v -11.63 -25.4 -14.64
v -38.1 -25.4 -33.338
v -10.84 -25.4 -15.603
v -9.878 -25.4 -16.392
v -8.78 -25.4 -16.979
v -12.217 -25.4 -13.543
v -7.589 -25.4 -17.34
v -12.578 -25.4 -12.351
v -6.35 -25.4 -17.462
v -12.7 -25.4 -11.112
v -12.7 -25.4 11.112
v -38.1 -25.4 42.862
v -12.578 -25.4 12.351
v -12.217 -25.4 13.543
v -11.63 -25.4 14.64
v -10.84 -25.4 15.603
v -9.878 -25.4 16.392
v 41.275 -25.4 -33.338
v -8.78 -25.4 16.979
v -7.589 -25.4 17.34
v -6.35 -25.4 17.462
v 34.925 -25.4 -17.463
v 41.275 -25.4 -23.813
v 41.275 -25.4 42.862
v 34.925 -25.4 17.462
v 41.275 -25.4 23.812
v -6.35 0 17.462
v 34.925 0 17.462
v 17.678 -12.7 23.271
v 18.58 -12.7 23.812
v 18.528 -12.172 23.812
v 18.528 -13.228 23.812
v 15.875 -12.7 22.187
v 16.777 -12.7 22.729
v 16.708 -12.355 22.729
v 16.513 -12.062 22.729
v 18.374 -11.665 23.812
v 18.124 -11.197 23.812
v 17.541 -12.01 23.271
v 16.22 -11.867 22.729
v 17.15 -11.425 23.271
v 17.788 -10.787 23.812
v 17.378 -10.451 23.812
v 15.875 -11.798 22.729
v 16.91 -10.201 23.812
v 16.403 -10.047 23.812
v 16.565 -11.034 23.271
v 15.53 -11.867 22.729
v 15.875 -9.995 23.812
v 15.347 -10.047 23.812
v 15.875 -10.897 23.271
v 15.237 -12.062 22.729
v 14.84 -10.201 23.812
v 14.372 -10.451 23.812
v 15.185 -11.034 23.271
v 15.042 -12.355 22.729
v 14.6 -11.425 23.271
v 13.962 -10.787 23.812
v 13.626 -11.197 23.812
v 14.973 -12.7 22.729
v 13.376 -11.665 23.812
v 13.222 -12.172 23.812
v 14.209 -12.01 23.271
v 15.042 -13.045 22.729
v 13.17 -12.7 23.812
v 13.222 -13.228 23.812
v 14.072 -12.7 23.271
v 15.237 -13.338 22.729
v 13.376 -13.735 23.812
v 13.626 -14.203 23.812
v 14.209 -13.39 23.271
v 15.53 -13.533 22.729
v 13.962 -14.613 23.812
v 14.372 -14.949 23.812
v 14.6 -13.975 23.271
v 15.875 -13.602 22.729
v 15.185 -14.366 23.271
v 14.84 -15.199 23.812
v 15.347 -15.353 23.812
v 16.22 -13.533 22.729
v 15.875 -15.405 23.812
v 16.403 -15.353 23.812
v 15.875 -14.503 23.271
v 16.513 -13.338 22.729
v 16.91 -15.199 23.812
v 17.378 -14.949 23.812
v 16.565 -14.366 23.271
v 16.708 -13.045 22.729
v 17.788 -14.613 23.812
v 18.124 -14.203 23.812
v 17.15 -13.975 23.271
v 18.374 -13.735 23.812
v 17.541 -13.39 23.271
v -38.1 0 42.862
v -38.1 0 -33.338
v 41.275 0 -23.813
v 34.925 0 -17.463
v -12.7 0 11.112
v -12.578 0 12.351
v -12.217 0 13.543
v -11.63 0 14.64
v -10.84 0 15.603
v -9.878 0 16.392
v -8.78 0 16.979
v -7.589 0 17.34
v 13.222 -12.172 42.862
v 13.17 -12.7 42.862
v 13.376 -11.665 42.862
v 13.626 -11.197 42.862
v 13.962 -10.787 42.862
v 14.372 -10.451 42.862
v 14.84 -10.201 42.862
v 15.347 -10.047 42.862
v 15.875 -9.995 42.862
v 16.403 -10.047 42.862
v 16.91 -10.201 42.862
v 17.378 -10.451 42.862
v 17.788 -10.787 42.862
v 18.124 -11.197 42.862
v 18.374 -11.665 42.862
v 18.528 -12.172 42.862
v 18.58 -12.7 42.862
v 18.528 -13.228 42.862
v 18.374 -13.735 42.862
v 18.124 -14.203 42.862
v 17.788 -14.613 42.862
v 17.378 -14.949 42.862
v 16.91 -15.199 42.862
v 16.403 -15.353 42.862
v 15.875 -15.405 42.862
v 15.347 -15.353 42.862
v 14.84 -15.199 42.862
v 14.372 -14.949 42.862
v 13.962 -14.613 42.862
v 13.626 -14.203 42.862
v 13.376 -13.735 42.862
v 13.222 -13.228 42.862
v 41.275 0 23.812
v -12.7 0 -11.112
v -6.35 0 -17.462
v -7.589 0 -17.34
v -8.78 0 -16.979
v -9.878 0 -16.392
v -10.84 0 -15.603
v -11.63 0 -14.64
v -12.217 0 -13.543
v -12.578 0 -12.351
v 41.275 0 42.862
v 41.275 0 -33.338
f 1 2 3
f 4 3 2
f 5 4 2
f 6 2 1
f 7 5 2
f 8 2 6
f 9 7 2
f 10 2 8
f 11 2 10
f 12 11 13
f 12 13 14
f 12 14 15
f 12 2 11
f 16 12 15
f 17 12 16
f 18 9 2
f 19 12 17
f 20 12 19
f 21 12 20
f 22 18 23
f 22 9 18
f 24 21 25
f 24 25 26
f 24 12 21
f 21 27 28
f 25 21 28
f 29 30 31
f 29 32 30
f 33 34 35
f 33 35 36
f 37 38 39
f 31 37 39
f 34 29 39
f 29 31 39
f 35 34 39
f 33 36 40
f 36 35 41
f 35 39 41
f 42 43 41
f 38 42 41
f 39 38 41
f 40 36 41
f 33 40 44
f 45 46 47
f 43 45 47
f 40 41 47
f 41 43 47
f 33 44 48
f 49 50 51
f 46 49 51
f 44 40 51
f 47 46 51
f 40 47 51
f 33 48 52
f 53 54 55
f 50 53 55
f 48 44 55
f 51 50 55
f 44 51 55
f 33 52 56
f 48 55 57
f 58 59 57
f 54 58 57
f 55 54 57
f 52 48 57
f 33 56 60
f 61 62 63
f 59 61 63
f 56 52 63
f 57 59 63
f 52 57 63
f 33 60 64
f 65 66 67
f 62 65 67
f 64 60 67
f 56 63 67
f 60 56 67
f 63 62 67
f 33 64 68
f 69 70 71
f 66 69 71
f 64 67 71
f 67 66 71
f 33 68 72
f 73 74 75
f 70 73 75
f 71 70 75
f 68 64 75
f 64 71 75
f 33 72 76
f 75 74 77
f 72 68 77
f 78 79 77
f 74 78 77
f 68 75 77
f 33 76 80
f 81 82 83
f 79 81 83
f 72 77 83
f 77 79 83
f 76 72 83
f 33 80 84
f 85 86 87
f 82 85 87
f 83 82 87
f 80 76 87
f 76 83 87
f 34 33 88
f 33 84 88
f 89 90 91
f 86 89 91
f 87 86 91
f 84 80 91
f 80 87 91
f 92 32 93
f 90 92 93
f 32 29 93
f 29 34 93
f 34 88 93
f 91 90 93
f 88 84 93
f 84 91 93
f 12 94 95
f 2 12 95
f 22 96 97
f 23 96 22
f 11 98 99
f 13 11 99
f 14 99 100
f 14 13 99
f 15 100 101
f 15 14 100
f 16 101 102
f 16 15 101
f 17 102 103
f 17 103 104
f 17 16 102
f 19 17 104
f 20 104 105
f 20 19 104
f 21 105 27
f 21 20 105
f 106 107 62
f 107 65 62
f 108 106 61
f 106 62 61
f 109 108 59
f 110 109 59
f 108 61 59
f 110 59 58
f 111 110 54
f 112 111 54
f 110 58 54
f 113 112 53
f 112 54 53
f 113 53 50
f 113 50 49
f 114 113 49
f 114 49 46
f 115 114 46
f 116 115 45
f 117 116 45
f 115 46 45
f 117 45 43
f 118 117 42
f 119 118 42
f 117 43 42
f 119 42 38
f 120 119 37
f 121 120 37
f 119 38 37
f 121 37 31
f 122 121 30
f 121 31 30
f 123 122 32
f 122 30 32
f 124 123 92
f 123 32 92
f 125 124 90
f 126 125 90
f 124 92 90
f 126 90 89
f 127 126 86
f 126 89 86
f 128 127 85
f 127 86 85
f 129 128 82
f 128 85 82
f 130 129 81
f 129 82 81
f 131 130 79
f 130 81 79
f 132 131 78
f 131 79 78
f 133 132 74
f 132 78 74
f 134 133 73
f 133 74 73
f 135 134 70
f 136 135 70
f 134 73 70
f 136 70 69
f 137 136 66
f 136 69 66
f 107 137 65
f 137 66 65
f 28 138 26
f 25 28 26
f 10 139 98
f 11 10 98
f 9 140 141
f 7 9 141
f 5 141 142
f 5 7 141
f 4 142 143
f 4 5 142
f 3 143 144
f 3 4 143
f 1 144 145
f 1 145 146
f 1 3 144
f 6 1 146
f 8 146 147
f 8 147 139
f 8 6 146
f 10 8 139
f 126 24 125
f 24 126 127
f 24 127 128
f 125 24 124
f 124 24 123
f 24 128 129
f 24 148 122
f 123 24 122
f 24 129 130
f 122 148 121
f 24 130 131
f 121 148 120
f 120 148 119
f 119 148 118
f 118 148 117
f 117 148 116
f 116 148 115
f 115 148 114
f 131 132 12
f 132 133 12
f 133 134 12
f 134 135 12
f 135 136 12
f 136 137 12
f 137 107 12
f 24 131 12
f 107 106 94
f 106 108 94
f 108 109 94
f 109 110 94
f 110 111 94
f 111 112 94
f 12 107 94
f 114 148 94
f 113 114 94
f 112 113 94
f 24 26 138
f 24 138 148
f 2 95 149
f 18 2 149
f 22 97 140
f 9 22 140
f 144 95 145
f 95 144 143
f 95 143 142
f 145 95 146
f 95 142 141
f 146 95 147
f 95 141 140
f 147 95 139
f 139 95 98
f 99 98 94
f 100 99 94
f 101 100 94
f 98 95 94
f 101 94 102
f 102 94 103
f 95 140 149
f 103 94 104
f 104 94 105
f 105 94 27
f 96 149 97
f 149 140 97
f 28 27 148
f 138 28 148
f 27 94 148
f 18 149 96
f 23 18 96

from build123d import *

# Parameters (mm, degrees)
F1_DEPTH = 25.4
F2_R     = 6.35
F3_SIZE  = 6.35
F5_D     = 5.4102
F5_DEPTH = 19.05
F5_TIP   = 1.6253880605


with BuildPart() as f1:
    # F0 (on Front) → F1 (new body)
    with BuildSketch(Plane.XZ):
        Polygon((41.275, 42.8625), (-38.1, 42.8625), (-38.1, -33.3375), (41.275, -33.3375), (41.275, -17.4625), (-12.7, -17.4625), (-12.7, 17.4625), (41.275, 17.4625), align=None)
    extrude(amount=F1_DEPTH)

    # F2
    f2_edges = [f1.edges().sort_by_distance(p)[0] for p in [
        (-12.7, -12.7, 17.4625),
        (-12.7, -12.7, -17.4625),
    ]]
    fillet(f2_edges, radius=F2_R)

    # F3
    f3_edges = [f1.edges().sort_by_distance(p)[0] for p in [
        (41.275, -12.7, -17.4625),
        (41.275, -12.7, 17.4625),
    ]]
    chamfer(f3_edges, length=F3_SIZE)

    # F5
    with Locations(Plane.XY.offset(42.8625)):
        with Locations((15.875, -12.7)):
            Hole(F5_D / 2, depth=F5_DEPTH)
            with Locations((0, 0, -(F5_DEPTH + F5_TIP / 2))):  # 118° drill point
                Cone(0, F5_D / 2, F5_TIP, mode=Mode.SUBTRACT)


solid = f1.part
